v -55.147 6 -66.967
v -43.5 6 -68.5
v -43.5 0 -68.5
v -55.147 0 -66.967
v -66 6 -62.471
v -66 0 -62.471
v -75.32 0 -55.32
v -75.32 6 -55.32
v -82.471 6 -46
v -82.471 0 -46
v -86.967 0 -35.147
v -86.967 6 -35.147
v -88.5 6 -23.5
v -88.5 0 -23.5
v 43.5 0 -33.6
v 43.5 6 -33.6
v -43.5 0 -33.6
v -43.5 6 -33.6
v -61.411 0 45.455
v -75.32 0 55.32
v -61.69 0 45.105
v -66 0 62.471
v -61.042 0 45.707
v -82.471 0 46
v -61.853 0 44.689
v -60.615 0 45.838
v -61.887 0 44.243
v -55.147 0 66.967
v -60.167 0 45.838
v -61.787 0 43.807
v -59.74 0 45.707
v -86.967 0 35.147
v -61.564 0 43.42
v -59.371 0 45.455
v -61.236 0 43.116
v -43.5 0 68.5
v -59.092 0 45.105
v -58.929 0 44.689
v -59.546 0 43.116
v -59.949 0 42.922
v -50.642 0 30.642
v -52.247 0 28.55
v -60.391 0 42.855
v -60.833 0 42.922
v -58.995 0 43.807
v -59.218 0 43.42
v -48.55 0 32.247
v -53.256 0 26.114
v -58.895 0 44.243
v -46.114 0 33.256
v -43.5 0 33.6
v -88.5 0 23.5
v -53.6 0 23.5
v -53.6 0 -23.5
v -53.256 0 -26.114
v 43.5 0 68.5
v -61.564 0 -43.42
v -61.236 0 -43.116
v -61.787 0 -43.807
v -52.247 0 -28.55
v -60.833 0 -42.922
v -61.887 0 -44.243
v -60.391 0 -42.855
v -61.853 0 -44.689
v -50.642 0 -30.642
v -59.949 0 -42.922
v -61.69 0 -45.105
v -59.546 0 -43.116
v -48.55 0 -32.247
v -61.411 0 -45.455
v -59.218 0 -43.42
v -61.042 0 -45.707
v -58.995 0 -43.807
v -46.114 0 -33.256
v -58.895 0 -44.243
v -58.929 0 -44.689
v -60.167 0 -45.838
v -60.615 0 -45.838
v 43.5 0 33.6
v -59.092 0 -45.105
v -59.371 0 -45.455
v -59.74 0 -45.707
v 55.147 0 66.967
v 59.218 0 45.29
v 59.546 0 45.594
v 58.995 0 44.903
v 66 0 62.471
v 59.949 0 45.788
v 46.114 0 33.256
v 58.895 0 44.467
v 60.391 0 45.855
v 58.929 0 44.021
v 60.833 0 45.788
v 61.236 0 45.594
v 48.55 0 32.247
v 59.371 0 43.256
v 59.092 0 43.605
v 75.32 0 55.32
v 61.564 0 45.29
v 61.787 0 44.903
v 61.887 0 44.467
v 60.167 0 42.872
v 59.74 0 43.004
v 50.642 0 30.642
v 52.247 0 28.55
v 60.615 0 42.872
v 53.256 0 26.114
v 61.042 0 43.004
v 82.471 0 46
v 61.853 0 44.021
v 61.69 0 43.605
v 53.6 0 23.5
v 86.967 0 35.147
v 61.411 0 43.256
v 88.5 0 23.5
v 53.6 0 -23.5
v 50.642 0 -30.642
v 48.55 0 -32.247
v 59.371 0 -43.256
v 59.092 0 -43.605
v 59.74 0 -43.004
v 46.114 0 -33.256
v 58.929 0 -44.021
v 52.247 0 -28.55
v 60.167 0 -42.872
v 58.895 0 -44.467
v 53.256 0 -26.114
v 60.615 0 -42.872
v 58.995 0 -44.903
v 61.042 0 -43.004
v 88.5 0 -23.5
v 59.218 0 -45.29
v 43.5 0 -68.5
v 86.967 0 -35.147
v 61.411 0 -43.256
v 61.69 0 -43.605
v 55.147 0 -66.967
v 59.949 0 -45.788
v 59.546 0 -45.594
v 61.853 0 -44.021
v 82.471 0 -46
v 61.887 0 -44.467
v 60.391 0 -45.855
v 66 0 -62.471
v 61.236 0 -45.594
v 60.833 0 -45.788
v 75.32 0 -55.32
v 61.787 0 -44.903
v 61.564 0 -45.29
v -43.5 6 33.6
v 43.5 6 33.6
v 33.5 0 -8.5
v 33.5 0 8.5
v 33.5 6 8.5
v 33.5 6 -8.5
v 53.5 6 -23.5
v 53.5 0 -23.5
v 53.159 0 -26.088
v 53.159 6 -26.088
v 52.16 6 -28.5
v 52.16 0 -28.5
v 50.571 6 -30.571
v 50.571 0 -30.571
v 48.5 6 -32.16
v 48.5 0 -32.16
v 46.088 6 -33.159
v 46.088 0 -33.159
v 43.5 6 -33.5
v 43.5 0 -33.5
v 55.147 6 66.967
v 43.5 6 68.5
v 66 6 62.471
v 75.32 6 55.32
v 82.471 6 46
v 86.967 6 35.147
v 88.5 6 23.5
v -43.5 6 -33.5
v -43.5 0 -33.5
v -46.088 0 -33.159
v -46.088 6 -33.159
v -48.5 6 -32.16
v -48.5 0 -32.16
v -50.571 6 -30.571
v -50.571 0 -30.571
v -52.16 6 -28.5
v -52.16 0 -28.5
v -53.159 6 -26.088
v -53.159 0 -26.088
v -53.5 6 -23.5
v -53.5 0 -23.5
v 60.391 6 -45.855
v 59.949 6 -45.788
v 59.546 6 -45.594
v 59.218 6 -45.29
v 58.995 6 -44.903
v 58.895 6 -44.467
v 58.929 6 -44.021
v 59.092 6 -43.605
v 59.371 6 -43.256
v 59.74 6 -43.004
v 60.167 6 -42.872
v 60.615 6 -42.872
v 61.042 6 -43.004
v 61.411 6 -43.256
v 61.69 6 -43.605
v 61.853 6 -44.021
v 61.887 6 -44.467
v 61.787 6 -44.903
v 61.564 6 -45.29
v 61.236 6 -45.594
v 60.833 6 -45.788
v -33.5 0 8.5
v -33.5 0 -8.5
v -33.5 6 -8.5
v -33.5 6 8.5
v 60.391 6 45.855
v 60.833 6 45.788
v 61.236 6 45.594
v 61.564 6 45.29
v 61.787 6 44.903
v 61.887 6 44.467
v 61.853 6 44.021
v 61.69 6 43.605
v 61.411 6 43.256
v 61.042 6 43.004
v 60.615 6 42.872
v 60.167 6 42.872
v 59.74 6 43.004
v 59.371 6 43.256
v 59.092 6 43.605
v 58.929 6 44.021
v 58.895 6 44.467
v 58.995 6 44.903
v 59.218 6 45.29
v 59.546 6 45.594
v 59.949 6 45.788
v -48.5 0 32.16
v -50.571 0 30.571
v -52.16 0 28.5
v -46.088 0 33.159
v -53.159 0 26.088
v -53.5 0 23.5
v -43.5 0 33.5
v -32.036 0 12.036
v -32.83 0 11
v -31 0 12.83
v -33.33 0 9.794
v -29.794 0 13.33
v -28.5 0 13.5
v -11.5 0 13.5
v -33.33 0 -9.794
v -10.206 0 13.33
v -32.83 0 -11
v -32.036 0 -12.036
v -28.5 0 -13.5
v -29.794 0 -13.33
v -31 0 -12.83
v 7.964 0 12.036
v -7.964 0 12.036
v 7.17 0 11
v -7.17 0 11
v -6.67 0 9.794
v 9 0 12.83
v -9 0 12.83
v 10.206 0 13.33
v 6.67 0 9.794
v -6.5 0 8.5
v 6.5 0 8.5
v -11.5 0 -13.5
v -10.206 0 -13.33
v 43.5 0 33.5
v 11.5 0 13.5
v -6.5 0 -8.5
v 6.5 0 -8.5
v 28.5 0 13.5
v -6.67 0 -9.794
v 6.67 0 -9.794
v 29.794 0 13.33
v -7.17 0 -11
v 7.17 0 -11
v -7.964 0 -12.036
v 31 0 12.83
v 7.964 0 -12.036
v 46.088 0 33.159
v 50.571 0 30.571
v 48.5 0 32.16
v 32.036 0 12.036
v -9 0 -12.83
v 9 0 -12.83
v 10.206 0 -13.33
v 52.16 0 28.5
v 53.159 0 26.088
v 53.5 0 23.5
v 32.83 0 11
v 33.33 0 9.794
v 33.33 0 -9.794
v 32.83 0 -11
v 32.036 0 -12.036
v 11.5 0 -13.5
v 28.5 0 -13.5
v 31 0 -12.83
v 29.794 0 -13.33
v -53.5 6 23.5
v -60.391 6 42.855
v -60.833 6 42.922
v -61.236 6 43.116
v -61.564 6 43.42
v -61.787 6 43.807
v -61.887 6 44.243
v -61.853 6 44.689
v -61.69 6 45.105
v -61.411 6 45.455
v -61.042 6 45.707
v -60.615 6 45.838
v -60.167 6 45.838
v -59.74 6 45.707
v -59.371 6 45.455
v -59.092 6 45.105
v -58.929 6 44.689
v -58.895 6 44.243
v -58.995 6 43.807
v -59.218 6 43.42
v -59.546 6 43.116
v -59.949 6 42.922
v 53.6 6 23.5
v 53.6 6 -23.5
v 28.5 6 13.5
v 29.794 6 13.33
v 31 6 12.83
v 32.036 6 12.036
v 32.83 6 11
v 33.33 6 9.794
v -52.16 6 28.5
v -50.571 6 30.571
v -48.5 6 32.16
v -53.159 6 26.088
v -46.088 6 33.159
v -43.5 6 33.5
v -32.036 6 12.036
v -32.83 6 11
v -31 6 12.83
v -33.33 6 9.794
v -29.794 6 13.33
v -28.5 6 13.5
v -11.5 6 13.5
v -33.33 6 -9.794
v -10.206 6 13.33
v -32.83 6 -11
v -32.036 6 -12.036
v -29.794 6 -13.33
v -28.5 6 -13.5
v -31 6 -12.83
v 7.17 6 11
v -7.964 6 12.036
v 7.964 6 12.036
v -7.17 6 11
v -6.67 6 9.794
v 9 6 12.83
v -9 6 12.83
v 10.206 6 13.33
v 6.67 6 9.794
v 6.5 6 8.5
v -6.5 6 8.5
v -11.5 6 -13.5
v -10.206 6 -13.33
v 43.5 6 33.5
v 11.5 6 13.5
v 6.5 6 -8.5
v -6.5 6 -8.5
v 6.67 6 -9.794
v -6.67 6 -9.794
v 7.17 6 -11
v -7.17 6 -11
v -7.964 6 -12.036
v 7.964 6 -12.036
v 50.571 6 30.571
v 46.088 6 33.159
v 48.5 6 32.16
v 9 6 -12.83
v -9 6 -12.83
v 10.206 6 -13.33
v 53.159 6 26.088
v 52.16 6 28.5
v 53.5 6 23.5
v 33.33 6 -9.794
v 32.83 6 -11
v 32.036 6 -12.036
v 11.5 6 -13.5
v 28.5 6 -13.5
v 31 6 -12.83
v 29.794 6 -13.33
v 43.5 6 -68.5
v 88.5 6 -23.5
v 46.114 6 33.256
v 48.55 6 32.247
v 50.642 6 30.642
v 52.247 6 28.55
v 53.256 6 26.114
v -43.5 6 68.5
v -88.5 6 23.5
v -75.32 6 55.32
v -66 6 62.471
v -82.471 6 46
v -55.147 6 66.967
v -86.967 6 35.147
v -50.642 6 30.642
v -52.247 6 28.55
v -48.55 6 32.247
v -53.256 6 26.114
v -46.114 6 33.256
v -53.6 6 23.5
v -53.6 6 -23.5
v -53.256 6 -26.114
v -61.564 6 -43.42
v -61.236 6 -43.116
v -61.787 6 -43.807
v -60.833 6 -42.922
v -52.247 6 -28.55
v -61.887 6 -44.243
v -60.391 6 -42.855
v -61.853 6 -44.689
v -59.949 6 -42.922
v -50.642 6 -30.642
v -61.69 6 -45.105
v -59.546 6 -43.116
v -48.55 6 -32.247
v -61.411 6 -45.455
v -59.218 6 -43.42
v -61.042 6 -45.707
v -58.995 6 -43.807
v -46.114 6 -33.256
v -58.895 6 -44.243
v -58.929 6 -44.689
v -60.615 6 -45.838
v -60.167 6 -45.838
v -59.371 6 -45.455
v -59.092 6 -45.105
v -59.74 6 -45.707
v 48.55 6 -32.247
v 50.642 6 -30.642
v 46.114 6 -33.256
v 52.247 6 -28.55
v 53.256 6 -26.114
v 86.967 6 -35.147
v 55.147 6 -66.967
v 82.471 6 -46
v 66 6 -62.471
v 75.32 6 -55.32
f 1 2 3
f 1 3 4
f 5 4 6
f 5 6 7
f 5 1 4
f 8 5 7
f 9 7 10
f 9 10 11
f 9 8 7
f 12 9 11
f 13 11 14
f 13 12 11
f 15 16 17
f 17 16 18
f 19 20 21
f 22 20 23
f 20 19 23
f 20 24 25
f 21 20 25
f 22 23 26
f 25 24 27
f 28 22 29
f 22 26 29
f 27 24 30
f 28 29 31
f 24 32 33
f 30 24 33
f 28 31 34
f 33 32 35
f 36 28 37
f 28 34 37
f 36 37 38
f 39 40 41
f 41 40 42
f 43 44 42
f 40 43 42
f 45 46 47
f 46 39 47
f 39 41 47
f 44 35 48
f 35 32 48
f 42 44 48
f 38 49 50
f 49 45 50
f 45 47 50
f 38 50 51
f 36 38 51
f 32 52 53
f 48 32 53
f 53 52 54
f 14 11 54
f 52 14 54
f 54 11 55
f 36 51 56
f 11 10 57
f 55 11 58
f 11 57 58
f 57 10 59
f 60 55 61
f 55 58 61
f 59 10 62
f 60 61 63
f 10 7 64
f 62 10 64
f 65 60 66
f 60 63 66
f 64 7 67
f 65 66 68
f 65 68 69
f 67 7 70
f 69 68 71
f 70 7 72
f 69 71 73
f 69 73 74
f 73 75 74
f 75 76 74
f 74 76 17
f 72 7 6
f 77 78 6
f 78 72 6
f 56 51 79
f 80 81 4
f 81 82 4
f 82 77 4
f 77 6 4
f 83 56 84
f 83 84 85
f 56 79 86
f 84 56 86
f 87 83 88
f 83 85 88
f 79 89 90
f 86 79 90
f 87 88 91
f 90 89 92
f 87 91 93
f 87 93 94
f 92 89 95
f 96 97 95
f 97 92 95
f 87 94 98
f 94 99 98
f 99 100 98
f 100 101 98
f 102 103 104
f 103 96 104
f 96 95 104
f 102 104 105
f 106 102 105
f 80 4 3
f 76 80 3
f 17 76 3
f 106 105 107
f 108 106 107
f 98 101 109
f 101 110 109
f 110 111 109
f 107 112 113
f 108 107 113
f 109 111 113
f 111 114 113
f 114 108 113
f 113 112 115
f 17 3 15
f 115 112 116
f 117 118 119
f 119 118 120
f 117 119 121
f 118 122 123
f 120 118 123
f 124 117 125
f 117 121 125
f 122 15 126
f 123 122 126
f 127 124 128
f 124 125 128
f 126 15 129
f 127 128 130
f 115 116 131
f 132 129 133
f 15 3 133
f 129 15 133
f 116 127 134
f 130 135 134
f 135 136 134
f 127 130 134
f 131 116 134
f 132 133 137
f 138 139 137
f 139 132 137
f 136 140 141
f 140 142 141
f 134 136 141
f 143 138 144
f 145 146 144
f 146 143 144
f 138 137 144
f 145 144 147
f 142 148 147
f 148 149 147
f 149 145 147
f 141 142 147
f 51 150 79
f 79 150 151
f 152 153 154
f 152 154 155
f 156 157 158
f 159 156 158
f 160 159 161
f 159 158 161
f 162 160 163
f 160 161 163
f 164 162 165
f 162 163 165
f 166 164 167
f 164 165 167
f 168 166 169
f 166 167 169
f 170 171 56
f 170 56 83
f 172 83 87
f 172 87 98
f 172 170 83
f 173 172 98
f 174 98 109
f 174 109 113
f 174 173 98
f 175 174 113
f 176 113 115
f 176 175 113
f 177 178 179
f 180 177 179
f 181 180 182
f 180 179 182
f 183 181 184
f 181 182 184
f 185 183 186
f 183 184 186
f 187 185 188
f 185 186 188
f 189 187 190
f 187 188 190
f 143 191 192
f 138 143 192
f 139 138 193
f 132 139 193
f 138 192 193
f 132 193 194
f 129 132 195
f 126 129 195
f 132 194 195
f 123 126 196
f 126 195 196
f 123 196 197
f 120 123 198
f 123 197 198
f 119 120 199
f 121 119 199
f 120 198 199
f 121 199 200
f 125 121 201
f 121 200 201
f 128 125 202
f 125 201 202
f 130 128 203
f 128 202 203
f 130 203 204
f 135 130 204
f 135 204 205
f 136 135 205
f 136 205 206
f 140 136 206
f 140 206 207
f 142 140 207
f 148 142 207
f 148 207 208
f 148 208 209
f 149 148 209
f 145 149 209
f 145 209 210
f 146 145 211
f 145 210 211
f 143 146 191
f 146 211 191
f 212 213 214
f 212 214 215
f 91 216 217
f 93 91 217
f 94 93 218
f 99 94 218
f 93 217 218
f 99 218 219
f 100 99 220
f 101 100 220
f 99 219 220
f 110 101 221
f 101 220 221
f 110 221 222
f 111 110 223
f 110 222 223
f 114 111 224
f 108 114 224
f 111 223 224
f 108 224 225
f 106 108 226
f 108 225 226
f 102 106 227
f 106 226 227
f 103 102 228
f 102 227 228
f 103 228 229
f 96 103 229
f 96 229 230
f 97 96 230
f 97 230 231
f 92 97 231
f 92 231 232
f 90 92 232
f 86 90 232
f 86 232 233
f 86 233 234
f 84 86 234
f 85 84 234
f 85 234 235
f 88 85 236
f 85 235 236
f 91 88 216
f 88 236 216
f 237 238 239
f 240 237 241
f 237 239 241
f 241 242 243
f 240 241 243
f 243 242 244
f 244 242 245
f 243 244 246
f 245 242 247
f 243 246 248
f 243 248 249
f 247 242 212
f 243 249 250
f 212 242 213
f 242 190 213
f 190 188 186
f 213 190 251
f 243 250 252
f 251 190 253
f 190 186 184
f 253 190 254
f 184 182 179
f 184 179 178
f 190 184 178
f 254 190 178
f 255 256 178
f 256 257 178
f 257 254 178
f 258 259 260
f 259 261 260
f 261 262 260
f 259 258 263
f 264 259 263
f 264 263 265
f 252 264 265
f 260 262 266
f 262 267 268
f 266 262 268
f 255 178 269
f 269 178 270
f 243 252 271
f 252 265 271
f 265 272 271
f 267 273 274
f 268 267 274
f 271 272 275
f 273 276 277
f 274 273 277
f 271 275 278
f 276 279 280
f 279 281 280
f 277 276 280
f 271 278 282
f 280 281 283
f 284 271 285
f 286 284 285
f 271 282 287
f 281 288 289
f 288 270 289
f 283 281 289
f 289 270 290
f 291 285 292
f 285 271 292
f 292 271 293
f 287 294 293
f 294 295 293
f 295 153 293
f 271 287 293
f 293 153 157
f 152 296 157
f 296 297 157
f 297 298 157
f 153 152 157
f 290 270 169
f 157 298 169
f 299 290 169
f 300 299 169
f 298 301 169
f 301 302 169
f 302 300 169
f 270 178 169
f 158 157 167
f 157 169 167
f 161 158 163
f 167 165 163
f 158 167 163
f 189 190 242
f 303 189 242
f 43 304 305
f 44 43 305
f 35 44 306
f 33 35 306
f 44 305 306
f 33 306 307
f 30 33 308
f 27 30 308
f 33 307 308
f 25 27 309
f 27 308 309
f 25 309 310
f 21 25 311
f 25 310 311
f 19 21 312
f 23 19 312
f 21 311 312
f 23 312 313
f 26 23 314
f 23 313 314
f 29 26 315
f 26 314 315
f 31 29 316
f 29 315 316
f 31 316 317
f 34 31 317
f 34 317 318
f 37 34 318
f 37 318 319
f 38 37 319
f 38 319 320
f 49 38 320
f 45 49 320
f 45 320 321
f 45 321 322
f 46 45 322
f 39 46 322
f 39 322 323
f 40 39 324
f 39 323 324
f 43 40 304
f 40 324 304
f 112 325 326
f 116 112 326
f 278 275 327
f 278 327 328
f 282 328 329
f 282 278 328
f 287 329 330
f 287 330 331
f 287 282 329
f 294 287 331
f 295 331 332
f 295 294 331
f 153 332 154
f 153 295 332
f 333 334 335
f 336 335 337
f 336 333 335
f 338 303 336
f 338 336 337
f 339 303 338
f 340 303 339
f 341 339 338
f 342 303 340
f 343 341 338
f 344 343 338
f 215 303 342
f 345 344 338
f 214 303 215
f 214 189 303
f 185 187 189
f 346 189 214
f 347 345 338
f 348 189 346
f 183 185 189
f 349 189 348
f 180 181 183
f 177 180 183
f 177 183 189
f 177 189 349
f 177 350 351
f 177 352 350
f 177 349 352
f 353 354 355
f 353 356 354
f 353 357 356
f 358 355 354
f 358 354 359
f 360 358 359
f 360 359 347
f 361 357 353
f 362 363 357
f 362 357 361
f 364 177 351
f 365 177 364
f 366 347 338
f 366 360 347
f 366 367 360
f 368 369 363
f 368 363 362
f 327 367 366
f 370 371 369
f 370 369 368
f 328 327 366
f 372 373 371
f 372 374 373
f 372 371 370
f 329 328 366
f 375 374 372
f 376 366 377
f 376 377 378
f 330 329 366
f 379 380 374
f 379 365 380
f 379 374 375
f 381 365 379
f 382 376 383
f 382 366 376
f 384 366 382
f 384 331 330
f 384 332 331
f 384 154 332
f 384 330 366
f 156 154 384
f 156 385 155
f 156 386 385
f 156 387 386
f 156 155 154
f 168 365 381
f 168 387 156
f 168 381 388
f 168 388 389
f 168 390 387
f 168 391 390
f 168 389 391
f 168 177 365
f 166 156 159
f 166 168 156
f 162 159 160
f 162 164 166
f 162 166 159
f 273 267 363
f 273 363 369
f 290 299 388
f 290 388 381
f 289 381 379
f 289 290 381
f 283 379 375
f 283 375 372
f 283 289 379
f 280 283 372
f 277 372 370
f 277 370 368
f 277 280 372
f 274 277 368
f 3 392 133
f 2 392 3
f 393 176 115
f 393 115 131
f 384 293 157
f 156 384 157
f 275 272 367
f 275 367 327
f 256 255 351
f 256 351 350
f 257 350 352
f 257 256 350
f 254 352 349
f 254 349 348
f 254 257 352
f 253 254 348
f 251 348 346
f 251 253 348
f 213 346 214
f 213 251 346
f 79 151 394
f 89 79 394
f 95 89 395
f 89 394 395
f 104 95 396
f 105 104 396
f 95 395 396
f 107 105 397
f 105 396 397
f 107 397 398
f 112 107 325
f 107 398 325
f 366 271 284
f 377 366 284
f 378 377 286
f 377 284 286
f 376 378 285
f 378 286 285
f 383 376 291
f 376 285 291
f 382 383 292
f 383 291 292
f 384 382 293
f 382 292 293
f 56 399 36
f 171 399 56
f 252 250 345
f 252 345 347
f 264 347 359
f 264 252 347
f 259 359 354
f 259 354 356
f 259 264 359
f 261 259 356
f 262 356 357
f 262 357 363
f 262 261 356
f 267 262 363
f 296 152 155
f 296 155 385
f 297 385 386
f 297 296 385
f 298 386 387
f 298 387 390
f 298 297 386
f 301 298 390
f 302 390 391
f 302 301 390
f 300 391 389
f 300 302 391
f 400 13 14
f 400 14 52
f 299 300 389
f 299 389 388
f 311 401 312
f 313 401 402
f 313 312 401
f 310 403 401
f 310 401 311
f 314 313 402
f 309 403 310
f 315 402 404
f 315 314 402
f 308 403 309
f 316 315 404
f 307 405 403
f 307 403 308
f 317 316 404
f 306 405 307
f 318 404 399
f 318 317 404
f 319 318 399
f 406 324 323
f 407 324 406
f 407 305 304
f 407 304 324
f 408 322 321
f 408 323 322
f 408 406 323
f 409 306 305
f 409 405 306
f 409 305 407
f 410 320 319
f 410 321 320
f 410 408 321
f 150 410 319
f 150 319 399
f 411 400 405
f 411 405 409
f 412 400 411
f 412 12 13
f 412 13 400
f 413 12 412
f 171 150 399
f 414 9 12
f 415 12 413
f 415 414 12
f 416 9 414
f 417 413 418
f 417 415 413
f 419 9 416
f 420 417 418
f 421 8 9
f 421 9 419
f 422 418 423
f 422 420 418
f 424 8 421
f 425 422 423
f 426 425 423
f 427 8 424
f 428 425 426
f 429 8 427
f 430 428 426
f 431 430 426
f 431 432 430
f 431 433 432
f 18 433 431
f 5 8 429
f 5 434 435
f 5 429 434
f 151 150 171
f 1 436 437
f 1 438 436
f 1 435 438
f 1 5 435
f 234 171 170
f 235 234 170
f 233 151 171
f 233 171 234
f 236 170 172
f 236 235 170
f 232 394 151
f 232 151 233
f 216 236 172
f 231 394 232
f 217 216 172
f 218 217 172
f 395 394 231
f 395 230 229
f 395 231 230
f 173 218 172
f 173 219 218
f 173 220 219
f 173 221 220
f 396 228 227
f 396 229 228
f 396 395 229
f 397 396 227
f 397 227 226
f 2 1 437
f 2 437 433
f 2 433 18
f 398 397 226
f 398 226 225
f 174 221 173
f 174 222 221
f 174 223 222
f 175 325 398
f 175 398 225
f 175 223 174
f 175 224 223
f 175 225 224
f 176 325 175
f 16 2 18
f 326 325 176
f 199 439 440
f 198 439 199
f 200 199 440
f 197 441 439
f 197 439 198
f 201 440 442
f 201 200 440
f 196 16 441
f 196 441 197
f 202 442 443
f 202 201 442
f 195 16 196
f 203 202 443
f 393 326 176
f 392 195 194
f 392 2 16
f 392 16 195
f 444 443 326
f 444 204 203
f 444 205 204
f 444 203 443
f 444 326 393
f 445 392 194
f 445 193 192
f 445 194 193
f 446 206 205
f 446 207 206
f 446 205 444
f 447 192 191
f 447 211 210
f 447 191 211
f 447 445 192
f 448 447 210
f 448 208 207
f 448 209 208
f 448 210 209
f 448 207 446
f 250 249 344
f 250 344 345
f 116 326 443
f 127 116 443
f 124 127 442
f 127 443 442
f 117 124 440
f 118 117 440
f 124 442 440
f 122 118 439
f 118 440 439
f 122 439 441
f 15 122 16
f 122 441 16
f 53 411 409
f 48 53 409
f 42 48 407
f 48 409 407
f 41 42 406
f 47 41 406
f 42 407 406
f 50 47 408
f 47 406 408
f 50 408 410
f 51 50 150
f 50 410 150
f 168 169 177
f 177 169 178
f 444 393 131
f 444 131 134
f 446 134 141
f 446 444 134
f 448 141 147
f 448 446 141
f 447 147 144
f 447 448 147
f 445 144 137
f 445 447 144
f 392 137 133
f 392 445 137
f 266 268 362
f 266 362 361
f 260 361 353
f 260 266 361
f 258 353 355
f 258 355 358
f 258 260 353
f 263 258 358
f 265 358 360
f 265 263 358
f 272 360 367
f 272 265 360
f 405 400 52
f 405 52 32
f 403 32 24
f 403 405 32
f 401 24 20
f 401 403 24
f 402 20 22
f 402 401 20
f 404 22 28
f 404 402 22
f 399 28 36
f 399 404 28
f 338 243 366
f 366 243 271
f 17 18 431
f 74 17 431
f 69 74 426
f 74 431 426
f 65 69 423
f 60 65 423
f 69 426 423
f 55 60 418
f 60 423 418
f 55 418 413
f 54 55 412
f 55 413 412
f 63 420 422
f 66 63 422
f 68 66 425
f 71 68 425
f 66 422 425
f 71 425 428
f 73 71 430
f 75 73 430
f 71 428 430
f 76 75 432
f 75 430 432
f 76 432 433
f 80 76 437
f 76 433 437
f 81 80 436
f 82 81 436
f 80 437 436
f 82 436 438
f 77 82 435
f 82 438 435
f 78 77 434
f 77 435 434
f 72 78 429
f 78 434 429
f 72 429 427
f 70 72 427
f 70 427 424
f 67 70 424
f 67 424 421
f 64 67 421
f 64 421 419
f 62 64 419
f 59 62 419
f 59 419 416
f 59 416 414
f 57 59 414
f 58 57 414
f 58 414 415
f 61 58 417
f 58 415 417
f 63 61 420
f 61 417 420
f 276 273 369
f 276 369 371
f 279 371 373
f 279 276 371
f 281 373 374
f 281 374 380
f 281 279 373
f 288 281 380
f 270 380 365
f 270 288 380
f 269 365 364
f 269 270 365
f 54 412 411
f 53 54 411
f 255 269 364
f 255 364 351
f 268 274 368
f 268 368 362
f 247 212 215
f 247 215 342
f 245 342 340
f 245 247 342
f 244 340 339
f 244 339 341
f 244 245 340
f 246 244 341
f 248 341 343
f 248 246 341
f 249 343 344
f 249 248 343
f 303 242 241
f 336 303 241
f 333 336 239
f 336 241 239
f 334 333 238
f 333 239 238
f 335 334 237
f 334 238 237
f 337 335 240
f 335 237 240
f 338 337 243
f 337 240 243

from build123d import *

# Parameters (mm, degrees)
BOSS_EXTRUDE1_DEPTH = 6
SKETCH2_R           = 1.5
BOSS_EXTRUDE2_DEPTH = 6


with BuildPart() as part:
    # Sketch1 → Boss-Extrude1 (new body)
    with BuildSketch(Plane(origin=(0, 0, 0), x_dir=(1, 0, 0), z_dir=(0, 1, 0))):
        with BuildLine():
            Line((-43.5, -33.5), (43.5, -33.5))
            ThreePointArc((43.5, -33.5), (50.571067812, -30.571067812), (53.5, -23.5))
            Line((53.5, -23.5), (53.5, 23.5))
            ThreePointArc((53.5, 23.5), (50.571067812, 30.571067812), (43.5, 33.5))
            Line((43.5, 33.5), (-43.5, 33.5))
            ThreePointArc((-43.5, 33.5), (-50.571067812, 30.571067812), (-53.5, 23.5))
            Line((-53.5, 23.5), (-53.5, -23.5))
            ThreePointArc((-53.5, -23.5), (-50.571067812, -30.571067812), (-43.5, -33.5))
        make_face()
        with BuildLine():
            Line((-28.5, -13.5), (-11.5, -13.5))
            ThreePointArc((-11.5, -13.5), (-7.964466094, -12.035533906), (-6.5, -8.5))
            Line((-6.5, -8.5), (-6.5, 8.5))
            ThreePointArc((-6.5, 8.5), (-7.964466094, 12.035533906), (-11.5, 13.5))
            Line((-11.5, 13.5), (-28.5, 13.5))
            ThreePointArc((-28.5, 13.5), (-32.035533906, 12.035533906), (-33.5, 8.5))
            Line((-33.5, 8.5), (-33.5, -8.5))
            ThreePointArc((-33.5, -8.5), (-32.035533906, -12.035533906), (-28.5, -13.5))
        make_face(mode=Mode.SUBTRACT)
        with BuildLine():
            Line((11.5, -13.5), (28.5, -13.5))
            ThreePointArc((28.5, -13.5), (32.035533906, -12.035533906), (33.5, -8.5))
            Line((33.5, -8.5), (33.5, 8.5))
            ThreePointArc((33.5, 8.5), (32.035533906, 12.035533906), (28.5, 13.5))
            Line((28.5, 13.5), (11.5, 13.5))
            ThreePointArc((11.5, 13.5), (7.964466094, 12.035533906), (6.5, 8.5))
            Line((6.5, 8.5), (6.5, -8.5))
            ThreePointArc((6.5, -8.5), (7.964466094, -12.035533906), (11.5, -13.5))
        make_face(mode=Mode.SUBTRACT)
    extrude(amount=BOSS_EXTRUDE1_DEPTH)


with BuildPart() as body_2:
    # Sketch2 → Boss-Extrude2 (new body)
    with BuildSketch(Plane(origin=(0, 6, 0), x_dir=(1, 0, 0), z_dir=(0, 1, 0))):
        with BuildLine():
            Line((-43.5, -68.5), (43.5, -68.5))
            ThreePointArc((43.5, -68.5), (75.319805153, -55.319805153), (88.5, -23.5))
            Line((88.5, -23.5), (88.5, 23.5))
            ThreePointArc((88.5, 23.5), (75.319805153, 55.319805153), (43.5, 68.5))
            Line((43.5, 68.5), (-43.5, 68.5))
            ThreePointArc((-43.5, 68.5), (-75.319805153, 55.319805153), (-88.5, 23.5))
            Line((-88.5, 23.5), (-88.5, -23.5))
            ThreePointArc((-88.5, -23.5), (-75.319805153, -55.319805153), (-43.5, -68.5))
        make_face()
        with Locations(Location((-60.390998648, 44.355110471, 0), (0, 0, 270))):
            Circle(SKETCH2_R, mode=Mode.SUBTRACT)
        with Locations(Location((60.390998648, 44.355110471, 0), (0, 0, 90))):
            Circle(SKETCH2_R, mode=Mode.SUBTRACT)
        with Locations(Location((-60.390998648, -44.355110471, 0), (0, 0, 90))):
            Circle(SKETCH2_R, mode=Mode.SUBTRACT)
        with Locations(Location((60.390998648, -44.355110471, 0), (0, 0, 270))):
            Circle(SKETCH2_R, mode=Mode.SUBTRACT)
        with BuildLine():
            Line((-43.5, -33.6), (43.5, -33.6))
            ThreePointArc((43.5, -33.6), (50.64177849, -30.64177849), (53.6, -23.5))
            Line((53.6, -23.5), (53.6, 23.5))
            ThreePointArc((53.6, 23.5), (50.64177849, 30.64177849), (43.5, 33.6))
            Line((43.5, 33.6), (-43.5, 33.6))
            ThreePointArc((-43.5, 33.6), (-50.64177849, 30.64177849), (-53.6, 23.5))
            Line((-53.6, 23.5), (-53.6, -23.5))
            ThreePointArc((-53.6, -23.5), (-50.64177849, -30.64177849), (-43.5, -33.6))
        make_face(mode=Mode.SUBTRACT)
    extrude(amount=-BOSS_EXTRUDE2_DEPTH)


solid = Compound([part.part, body_2.part])
